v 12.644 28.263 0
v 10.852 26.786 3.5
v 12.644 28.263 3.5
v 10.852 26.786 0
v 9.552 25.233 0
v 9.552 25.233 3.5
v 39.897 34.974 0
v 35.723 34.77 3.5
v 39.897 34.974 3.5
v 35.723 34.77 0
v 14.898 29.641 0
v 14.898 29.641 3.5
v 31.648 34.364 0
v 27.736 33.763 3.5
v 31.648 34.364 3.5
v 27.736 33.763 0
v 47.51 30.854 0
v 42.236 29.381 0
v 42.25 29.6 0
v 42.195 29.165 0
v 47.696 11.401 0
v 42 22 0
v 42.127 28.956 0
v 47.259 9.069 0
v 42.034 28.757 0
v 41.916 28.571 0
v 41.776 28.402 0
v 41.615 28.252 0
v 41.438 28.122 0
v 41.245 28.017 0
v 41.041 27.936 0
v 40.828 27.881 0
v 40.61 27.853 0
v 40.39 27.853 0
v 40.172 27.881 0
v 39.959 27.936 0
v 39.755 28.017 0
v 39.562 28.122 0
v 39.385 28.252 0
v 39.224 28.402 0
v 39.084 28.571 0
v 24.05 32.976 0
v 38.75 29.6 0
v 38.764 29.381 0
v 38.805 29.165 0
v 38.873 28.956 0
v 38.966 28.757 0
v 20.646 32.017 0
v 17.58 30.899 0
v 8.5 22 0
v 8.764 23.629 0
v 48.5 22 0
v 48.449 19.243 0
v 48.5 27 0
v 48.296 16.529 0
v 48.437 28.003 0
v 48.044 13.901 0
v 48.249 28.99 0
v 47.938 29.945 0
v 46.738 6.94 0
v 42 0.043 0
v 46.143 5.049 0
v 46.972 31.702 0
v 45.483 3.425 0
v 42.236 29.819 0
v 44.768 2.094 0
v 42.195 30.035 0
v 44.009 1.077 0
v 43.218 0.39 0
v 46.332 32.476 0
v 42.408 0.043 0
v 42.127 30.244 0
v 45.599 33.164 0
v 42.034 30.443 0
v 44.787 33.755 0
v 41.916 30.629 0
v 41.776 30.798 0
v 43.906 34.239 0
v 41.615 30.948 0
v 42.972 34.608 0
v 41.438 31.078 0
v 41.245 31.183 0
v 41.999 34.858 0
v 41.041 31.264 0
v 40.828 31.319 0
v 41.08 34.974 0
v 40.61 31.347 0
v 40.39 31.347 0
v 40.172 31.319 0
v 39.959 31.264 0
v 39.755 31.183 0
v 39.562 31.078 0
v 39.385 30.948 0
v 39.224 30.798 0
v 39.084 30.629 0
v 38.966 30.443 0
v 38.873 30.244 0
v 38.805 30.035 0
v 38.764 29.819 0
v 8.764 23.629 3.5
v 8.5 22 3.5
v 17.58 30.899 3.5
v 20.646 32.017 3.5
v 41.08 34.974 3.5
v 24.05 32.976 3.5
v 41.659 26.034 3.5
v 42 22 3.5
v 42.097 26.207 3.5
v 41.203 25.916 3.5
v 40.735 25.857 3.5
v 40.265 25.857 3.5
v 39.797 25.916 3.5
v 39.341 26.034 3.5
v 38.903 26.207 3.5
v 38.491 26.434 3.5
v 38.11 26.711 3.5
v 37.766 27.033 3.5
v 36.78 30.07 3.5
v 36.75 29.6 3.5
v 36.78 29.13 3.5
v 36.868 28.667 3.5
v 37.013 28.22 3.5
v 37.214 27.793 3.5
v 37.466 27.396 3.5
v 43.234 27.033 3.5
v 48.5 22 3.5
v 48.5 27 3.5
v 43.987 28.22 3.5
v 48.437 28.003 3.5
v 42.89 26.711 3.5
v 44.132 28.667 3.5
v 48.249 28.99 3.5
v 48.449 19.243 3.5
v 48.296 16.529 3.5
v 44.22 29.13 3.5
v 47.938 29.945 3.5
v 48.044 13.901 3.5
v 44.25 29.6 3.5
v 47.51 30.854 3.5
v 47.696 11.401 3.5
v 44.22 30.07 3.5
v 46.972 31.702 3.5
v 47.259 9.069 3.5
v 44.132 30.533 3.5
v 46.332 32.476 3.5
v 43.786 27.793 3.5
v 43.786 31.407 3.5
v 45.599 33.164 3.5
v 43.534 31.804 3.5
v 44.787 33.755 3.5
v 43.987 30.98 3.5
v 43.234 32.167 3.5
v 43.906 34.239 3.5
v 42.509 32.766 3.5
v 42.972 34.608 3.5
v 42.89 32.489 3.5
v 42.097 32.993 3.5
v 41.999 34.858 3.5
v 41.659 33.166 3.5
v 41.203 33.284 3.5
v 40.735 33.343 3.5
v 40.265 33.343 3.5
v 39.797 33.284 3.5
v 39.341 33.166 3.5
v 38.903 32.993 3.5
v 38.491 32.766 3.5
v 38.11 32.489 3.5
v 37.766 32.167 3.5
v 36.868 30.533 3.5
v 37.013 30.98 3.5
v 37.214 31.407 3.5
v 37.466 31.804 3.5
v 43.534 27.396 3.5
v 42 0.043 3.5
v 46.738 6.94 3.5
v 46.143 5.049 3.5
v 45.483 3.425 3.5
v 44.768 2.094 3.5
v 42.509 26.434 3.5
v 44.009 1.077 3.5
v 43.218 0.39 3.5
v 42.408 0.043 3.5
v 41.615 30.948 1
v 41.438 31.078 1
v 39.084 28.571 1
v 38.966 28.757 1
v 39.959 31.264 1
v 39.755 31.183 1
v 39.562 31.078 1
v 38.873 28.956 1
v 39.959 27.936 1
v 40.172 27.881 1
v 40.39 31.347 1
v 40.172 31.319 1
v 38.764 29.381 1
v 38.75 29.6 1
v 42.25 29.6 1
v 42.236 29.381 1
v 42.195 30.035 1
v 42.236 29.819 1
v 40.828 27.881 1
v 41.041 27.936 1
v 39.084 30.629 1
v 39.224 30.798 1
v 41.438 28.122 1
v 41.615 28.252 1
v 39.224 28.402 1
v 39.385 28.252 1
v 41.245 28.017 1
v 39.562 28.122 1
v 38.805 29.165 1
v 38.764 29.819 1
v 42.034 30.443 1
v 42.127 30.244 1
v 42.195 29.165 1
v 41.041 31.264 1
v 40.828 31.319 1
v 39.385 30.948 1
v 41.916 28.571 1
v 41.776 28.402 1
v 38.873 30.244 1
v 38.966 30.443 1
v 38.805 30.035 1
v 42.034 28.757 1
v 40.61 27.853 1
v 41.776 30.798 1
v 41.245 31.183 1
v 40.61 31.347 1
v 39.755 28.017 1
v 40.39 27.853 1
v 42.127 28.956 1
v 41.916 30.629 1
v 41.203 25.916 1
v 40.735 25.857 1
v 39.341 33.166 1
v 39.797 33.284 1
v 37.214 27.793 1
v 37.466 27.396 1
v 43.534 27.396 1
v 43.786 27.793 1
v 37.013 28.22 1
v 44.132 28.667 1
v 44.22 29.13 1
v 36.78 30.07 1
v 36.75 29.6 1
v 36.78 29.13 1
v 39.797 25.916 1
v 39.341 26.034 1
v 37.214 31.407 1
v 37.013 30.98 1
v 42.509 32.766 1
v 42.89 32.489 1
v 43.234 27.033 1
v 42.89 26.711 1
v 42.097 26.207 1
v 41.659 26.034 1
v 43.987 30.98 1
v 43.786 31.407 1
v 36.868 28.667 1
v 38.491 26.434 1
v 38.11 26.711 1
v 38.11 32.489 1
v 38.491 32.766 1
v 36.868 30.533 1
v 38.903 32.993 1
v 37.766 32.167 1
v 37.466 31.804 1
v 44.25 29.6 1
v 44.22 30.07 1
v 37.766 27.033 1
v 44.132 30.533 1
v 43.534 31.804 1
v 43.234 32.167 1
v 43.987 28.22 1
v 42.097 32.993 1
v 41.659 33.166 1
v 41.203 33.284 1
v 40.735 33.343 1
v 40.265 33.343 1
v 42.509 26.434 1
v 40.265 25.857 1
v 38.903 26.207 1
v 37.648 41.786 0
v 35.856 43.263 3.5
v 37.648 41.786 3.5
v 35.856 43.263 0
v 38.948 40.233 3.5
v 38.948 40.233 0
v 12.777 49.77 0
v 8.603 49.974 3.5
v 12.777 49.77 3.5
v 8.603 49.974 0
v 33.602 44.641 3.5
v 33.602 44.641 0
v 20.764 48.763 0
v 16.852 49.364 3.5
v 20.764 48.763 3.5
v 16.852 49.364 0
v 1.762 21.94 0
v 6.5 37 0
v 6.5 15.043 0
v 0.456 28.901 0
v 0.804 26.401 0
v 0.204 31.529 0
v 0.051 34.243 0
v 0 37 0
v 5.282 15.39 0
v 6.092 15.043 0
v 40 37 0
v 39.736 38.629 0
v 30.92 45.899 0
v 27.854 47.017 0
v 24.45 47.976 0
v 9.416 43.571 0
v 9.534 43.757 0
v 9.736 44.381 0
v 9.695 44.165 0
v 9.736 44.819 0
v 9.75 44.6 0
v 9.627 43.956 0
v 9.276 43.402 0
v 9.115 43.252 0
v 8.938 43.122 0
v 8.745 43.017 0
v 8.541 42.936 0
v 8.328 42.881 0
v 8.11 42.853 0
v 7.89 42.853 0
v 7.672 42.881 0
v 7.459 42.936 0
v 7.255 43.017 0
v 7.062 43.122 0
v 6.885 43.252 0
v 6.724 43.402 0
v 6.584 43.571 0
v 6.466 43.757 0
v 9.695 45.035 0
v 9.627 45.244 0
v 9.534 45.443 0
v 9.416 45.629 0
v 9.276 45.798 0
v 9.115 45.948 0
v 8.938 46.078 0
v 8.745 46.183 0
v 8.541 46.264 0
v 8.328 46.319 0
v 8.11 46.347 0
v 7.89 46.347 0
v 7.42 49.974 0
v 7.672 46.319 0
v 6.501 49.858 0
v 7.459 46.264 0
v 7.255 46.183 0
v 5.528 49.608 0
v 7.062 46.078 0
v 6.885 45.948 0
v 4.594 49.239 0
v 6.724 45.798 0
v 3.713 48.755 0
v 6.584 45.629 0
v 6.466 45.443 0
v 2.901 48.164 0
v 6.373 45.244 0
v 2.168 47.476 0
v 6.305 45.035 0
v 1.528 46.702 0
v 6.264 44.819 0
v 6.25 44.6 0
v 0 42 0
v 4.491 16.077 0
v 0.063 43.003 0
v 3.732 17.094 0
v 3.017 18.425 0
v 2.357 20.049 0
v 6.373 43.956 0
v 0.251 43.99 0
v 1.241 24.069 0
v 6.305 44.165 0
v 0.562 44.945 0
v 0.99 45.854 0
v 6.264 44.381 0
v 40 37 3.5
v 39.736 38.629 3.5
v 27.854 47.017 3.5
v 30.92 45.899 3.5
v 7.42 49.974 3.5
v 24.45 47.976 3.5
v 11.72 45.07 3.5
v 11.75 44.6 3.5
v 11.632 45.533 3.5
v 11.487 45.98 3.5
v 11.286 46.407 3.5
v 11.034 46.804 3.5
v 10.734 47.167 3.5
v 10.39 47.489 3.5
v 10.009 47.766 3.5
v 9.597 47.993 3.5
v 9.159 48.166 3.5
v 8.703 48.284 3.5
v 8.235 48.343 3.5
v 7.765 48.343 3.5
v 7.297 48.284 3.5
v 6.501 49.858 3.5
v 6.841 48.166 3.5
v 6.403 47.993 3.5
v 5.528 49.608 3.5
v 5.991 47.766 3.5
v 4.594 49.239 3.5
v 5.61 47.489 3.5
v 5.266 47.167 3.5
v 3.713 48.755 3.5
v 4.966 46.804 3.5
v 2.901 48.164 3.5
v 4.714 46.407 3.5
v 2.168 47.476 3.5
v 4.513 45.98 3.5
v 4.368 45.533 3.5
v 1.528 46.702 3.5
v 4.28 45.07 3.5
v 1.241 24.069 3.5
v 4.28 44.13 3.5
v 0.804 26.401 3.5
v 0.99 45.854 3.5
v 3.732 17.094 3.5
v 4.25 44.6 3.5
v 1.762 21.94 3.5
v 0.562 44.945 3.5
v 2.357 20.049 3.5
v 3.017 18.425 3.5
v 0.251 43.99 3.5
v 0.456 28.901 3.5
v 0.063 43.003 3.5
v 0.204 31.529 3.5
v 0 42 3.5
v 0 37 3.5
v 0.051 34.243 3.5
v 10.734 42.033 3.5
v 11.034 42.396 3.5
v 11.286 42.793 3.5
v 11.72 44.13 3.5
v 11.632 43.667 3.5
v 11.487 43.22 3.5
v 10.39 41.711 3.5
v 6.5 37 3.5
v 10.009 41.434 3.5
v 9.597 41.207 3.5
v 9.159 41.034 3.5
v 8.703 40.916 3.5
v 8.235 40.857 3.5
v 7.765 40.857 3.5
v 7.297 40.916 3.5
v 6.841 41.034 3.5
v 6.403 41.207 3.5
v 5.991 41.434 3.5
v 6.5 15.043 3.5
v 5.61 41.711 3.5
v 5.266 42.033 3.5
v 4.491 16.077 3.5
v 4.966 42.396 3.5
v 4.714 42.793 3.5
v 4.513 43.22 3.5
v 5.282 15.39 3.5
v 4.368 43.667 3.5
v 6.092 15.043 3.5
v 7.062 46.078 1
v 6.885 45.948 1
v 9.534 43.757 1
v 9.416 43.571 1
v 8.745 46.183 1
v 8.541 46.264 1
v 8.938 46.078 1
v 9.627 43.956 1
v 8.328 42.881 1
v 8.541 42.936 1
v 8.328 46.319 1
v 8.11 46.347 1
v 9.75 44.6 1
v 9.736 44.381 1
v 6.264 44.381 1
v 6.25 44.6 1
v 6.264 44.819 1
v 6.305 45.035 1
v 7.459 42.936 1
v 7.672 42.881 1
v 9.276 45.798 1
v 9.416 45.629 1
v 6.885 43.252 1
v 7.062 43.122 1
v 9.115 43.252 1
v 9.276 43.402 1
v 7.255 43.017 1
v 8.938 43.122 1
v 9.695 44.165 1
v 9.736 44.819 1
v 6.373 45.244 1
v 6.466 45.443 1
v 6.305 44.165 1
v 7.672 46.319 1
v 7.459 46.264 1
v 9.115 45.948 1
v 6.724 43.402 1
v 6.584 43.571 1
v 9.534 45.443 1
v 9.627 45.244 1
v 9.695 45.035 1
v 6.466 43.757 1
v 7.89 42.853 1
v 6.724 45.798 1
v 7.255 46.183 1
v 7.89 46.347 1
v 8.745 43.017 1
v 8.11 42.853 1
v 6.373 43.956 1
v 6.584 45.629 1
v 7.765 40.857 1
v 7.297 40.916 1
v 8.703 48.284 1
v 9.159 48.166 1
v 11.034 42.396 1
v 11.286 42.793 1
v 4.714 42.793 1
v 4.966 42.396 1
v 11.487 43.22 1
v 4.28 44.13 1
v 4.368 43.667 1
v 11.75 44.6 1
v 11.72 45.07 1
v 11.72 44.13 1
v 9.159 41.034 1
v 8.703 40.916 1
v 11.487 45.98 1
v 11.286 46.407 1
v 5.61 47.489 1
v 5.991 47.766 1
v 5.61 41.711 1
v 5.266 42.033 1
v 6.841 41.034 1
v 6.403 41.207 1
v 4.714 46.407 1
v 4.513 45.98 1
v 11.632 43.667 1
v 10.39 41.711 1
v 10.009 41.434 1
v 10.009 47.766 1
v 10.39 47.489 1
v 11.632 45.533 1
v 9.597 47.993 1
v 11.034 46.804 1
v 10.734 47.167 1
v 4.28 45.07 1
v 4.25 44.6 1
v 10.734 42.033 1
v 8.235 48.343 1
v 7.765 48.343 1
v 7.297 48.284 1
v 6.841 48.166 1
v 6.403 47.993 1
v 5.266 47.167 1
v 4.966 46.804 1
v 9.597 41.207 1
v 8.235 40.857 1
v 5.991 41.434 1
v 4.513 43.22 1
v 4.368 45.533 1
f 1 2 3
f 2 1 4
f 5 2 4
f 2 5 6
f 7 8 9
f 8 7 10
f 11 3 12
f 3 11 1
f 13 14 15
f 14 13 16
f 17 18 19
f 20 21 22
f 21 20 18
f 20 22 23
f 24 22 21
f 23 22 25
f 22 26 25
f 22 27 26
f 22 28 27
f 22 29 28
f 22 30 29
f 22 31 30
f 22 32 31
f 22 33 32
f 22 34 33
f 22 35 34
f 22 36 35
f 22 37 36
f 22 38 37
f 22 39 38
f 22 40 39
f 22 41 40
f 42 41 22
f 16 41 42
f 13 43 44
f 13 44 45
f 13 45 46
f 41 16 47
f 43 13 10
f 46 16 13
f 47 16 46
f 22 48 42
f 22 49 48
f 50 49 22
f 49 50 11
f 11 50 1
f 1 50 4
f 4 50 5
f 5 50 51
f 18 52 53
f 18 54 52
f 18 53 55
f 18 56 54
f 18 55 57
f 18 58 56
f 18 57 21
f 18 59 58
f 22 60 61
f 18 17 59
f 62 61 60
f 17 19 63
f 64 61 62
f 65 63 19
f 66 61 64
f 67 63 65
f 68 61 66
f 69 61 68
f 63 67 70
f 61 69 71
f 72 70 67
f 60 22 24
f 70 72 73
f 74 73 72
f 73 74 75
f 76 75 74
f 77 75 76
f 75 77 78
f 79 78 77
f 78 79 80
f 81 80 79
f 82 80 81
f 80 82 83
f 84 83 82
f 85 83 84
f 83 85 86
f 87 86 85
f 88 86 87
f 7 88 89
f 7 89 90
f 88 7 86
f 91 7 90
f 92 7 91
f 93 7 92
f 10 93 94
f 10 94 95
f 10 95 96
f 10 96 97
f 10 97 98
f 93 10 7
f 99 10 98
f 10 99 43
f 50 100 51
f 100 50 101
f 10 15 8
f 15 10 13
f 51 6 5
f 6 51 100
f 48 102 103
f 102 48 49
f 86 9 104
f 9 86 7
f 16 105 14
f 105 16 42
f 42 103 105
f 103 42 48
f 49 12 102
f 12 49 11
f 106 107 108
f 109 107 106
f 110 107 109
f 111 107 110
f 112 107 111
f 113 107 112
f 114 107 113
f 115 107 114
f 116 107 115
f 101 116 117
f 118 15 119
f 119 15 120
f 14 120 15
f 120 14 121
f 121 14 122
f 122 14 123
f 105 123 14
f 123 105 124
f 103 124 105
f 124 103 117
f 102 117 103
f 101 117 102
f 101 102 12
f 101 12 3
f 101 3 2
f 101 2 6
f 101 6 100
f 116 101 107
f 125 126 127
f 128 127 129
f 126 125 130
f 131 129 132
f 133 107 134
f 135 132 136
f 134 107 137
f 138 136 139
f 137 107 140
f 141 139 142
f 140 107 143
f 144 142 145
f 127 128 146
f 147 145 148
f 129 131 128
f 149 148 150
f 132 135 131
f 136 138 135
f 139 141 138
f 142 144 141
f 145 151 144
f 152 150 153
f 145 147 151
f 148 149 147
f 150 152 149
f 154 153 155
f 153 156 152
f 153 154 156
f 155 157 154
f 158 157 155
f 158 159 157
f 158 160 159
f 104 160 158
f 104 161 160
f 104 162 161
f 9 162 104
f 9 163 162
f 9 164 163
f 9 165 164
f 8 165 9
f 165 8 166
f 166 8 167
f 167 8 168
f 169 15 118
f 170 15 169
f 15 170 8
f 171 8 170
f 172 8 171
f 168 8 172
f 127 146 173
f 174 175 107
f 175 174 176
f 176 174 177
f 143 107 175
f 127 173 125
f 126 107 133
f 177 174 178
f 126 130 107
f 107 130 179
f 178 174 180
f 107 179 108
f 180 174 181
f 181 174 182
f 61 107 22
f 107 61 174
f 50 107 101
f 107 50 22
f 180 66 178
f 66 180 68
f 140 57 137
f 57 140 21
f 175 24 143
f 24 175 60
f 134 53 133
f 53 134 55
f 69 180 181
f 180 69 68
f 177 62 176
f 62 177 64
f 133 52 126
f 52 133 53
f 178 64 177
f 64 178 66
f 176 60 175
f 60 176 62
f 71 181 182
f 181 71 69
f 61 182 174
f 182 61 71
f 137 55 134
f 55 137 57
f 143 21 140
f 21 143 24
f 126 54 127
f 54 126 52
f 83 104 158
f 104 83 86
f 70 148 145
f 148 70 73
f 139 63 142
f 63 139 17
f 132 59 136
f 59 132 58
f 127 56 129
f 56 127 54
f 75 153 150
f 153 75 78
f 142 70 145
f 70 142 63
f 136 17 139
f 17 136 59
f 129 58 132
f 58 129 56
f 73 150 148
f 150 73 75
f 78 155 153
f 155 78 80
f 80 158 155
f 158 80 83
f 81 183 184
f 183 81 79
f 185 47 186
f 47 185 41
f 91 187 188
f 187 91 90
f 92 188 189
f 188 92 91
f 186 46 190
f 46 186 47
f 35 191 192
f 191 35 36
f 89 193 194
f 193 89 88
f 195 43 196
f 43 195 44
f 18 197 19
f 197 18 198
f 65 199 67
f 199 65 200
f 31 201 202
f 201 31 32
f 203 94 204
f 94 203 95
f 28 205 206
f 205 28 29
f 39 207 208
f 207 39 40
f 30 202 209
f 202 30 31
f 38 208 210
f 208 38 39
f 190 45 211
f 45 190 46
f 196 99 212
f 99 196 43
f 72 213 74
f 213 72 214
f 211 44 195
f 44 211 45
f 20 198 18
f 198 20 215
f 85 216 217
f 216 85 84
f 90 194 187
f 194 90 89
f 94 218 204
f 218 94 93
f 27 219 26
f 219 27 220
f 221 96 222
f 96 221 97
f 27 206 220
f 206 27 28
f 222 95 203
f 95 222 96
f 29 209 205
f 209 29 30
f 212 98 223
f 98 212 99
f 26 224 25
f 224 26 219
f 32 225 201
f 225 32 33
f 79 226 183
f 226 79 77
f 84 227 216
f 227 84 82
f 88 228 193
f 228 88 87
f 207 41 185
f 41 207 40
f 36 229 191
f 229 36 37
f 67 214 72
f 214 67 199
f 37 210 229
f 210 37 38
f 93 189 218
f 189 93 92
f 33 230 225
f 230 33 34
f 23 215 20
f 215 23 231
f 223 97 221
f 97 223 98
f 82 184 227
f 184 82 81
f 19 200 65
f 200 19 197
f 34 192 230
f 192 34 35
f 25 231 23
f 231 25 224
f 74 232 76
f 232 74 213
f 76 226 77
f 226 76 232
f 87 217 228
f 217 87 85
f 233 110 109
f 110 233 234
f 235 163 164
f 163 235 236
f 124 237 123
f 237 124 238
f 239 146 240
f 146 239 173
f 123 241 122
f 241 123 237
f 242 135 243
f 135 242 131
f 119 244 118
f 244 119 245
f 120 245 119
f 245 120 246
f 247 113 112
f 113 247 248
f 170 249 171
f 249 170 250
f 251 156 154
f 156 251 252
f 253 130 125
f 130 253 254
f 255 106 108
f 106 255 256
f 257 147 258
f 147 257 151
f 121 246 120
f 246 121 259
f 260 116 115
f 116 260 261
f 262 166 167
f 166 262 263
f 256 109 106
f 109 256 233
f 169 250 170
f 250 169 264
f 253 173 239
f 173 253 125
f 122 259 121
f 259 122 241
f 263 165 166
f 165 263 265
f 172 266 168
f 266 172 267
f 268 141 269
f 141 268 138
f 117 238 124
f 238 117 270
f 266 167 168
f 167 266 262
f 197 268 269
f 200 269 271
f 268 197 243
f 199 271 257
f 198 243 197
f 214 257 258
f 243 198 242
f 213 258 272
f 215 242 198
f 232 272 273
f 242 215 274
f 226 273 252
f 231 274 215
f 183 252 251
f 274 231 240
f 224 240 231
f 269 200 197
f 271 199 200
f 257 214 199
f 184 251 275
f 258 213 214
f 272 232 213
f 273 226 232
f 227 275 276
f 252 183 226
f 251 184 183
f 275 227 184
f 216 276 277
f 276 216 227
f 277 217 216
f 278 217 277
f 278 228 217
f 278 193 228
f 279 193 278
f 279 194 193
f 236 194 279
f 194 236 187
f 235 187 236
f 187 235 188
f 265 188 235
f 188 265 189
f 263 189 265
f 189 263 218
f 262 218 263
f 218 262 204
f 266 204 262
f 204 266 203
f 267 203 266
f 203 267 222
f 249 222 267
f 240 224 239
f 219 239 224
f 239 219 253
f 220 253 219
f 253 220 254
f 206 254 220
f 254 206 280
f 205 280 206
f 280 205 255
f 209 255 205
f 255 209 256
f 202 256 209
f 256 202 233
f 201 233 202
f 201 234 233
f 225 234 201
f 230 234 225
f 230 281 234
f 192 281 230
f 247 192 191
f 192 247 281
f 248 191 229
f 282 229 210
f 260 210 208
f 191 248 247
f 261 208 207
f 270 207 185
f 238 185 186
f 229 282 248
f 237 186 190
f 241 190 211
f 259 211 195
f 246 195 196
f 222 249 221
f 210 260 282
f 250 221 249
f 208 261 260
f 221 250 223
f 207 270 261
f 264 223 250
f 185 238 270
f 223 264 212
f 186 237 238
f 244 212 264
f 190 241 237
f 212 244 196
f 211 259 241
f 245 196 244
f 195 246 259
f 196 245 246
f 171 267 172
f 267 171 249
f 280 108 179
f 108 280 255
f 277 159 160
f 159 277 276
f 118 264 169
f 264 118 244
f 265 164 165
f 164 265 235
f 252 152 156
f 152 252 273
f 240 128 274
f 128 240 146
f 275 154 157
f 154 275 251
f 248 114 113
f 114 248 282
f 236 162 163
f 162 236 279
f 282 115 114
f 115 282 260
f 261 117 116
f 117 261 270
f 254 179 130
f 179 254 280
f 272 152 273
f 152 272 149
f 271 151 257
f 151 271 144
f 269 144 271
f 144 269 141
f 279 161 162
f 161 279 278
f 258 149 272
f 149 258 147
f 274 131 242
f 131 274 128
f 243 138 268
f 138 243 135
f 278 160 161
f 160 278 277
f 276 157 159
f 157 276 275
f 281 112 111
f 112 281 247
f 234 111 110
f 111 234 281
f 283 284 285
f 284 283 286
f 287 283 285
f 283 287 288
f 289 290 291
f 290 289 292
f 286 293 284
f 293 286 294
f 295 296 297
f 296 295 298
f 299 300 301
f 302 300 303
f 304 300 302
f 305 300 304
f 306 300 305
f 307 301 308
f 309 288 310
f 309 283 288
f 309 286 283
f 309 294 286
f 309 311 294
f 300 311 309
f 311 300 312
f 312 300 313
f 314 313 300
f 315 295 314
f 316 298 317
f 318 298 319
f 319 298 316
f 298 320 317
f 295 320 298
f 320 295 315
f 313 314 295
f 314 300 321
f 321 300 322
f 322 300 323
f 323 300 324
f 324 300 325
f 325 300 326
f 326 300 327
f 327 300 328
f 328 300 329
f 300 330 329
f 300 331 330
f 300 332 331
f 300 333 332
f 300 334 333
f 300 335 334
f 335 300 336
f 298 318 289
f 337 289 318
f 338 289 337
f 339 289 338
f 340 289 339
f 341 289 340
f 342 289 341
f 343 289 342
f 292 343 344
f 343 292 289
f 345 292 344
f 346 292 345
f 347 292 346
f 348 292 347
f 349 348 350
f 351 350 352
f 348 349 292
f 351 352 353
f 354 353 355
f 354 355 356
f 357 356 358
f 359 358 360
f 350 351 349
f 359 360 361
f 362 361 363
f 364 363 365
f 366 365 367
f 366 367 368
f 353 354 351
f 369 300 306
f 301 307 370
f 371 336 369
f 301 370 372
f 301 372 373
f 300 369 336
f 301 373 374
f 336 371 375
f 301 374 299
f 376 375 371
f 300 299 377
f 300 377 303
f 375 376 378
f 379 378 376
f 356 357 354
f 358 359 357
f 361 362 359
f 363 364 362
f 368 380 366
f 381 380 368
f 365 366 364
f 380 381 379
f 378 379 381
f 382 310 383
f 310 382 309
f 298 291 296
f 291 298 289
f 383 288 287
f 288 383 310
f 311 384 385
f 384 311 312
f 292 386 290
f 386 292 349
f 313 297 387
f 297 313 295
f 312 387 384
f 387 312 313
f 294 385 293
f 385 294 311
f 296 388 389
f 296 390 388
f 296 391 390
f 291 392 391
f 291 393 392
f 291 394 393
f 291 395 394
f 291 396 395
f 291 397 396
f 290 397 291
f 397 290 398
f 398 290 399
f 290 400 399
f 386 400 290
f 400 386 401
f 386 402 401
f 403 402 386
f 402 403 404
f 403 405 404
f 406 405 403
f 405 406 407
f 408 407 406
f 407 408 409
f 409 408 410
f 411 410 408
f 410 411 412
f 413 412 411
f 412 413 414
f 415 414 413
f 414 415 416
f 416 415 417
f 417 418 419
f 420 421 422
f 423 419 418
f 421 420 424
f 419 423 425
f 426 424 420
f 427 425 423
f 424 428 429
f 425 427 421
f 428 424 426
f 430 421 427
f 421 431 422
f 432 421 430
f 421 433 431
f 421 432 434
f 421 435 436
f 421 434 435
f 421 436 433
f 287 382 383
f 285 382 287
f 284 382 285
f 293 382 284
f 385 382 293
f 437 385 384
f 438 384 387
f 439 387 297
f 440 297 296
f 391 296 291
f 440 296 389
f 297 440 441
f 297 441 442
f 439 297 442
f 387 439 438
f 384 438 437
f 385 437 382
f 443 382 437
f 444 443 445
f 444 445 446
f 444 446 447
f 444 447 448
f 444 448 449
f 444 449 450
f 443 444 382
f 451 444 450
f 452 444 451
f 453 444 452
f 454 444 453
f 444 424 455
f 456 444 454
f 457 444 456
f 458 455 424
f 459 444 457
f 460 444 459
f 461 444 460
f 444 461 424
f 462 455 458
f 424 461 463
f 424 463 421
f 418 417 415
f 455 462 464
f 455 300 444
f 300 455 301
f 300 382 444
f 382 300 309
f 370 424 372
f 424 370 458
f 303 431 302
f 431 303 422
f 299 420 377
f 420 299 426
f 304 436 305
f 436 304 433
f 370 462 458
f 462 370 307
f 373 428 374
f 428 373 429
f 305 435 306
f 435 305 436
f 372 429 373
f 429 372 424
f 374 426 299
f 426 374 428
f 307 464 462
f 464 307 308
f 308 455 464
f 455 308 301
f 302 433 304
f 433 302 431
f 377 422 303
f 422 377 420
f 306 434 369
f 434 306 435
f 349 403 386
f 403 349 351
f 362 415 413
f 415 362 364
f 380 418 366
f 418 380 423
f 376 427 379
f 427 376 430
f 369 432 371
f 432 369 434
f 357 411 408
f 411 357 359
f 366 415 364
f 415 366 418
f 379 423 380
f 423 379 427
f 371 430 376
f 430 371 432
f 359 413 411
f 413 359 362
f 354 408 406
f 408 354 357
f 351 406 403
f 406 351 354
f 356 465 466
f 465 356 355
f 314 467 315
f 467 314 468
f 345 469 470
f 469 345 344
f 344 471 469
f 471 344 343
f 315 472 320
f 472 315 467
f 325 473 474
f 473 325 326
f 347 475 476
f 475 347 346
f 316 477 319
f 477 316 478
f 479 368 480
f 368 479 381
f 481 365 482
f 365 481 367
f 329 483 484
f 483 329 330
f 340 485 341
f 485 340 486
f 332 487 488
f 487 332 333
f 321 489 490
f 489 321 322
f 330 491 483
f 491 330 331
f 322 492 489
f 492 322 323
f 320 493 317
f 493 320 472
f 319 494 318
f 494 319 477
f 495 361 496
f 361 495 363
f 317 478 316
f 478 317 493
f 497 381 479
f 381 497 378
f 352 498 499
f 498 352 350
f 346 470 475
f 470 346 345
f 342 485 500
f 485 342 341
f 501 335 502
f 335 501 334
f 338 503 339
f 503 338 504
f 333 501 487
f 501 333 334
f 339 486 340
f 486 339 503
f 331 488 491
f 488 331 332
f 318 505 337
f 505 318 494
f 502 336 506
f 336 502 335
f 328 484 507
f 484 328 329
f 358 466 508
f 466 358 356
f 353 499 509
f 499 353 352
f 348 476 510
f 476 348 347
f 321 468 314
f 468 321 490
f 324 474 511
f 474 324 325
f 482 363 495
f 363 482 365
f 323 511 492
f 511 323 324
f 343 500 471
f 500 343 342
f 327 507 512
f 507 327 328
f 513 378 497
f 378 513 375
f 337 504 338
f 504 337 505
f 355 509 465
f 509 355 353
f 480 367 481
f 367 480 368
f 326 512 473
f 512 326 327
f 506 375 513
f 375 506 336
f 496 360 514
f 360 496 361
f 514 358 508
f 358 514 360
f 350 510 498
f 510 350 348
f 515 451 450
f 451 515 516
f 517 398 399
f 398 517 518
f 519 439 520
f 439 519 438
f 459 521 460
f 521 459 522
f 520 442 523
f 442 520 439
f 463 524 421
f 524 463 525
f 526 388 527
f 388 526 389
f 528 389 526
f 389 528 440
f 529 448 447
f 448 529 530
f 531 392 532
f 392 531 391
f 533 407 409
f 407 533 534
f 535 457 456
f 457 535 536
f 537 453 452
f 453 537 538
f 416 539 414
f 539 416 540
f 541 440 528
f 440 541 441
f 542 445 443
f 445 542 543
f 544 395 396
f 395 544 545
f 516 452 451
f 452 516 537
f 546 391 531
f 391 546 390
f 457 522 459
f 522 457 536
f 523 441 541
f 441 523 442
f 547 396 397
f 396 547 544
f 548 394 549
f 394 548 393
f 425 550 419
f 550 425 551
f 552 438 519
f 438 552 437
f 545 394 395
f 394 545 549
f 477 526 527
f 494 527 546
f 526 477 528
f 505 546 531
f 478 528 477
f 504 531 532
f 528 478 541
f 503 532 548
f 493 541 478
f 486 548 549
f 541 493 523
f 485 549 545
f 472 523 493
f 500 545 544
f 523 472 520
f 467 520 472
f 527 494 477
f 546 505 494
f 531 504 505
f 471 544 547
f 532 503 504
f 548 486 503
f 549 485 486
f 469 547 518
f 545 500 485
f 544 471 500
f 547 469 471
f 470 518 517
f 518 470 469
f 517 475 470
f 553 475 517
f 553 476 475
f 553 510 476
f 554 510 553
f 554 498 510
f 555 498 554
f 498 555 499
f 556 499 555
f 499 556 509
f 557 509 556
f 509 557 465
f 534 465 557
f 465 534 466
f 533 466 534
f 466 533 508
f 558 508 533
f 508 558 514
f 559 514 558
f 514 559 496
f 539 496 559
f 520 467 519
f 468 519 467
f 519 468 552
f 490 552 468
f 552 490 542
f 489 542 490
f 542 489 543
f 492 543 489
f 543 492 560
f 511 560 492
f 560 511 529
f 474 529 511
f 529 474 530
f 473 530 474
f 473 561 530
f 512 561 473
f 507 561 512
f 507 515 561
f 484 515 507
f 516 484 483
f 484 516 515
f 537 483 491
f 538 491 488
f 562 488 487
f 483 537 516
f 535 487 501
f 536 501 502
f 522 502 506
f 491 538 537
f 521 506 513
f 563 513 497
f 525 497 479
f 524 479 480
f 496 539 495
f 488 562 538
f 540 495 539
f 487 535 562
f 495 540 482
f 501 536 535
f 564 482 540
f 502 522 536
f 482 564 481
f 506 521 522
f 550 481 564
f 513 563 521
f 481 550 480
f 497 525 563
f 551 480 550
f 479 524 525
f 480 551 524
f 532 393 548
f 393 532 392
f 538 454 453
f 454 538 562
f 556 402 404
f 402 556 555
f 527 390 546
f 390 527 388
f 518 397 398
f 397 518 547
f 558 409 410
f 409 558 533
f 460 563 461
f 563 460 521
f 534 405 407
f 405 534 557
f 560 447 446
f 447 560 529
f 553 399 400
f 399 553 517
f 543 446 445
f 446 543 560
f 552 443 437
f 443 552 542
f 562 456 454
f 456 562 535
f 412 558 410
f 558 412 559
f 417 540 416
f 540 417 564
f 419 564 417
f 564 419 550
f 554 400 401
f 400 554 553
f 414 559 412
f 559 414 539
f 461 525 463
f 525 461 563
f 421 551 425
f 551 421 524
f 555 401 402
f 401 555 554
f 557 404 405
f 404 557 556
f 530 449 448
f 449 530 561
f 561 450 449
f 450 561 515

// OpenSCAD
$fn=50;

platen_thick = 3.5;
y_length = 35;
y_thickness = 6.5;
x_length = 40;
x_thickness = 13;
washer_diameter = 7.5;
screw_diameter = 3.5;
screw_radius_distance_from_glass_y = 7.6;
screw_radius_distance_from_glass_x = 1.5;
corner_round_diameter = 8;
screw_suppport_thickness = 1;

module xPartSmoothCylinder() {
translate([y_thickness,x_thickness]){
scale([(x_length-y_thickness)/x_thickness, 1, 1])
cylinder(platen_thick, x_thickness, x_thickness);
}
}


module yPartSmoothCylinder() {
    translate([y_thickness, x_thickness]){
        scale([1, (y_length-x_thickness)/y_thickness, 1])
            cylinder(platen_thick, y_thickness, y_thickness);
}
}


module xPart() {
    intersection(){
        xPartSmoothCylinder();
        translate([y_thickness, 0])
    cube([x_length-y_thickness,x_thickness,platen_thick]); 
          }   
}

module yPart() {
    intersection(){
        yPartSmoothCylinder();
        translate ([0, x_thickness])
    cube([y_thickness,y_length-x_thickness,platen_thick]);
    }
}

module union_block() {
    cube([y_thickness, x_thickness, platen_thick]);
}


module ScrewHole() {
  cylinder(platen_thick, d1=screw_diameter, d2=screw_diameter, center=false);  
}

module WasherHole() {
    translate([0,0,screw_suppport_thickness])
  cylinder(platen_thick, d1=washer_diameter, d2=washer_diameter, center=false);  
}


module RoundedCorner(){
translate([0, 0])
difference(){
cube([corner_round_diameter, corner_round_diameter, 2 * platen_thick]);
    translate([corner_round_diameter, corner_round_diameter]){
cylinder(2*platen_thick, corner_round_diameter, corner_round_diameter, center=false);
}}}

module MakeBracketRight(){
difference(){
    union(){
        xPart();
        yPart();
        union_block();
    };
    translate([y_thickness+screw_radius_distance_from_glass_x,x_thickness-screw_radius_distance_from_glass_y]){ScrewHole();
    }
    translate([y_thickness+screw_radius_distance_from_glass_x,x_thickness-screw_radius_distance_from_glass_y]){WasherHole();
    }
    RoundedCorner();
}
}



module MakeBracketRightSet() {
//MakeBracketRight();
translate([x_length+y_thickness+2,y_length])
rotate(a= 180, v=[0,0,1])
MakeBracketRight();
}


module MakeBracketLeftSet(){
    translate([x_length+y_thickness+2, x_thickness +2 ])
    mirror()
    MakeBracketRightSet();
}

MakeBracketRightSet();
MakeBracketLeftSet();

//translate([2*x_length+5, 0, 0])
//mirror()
//MakeBracket();


